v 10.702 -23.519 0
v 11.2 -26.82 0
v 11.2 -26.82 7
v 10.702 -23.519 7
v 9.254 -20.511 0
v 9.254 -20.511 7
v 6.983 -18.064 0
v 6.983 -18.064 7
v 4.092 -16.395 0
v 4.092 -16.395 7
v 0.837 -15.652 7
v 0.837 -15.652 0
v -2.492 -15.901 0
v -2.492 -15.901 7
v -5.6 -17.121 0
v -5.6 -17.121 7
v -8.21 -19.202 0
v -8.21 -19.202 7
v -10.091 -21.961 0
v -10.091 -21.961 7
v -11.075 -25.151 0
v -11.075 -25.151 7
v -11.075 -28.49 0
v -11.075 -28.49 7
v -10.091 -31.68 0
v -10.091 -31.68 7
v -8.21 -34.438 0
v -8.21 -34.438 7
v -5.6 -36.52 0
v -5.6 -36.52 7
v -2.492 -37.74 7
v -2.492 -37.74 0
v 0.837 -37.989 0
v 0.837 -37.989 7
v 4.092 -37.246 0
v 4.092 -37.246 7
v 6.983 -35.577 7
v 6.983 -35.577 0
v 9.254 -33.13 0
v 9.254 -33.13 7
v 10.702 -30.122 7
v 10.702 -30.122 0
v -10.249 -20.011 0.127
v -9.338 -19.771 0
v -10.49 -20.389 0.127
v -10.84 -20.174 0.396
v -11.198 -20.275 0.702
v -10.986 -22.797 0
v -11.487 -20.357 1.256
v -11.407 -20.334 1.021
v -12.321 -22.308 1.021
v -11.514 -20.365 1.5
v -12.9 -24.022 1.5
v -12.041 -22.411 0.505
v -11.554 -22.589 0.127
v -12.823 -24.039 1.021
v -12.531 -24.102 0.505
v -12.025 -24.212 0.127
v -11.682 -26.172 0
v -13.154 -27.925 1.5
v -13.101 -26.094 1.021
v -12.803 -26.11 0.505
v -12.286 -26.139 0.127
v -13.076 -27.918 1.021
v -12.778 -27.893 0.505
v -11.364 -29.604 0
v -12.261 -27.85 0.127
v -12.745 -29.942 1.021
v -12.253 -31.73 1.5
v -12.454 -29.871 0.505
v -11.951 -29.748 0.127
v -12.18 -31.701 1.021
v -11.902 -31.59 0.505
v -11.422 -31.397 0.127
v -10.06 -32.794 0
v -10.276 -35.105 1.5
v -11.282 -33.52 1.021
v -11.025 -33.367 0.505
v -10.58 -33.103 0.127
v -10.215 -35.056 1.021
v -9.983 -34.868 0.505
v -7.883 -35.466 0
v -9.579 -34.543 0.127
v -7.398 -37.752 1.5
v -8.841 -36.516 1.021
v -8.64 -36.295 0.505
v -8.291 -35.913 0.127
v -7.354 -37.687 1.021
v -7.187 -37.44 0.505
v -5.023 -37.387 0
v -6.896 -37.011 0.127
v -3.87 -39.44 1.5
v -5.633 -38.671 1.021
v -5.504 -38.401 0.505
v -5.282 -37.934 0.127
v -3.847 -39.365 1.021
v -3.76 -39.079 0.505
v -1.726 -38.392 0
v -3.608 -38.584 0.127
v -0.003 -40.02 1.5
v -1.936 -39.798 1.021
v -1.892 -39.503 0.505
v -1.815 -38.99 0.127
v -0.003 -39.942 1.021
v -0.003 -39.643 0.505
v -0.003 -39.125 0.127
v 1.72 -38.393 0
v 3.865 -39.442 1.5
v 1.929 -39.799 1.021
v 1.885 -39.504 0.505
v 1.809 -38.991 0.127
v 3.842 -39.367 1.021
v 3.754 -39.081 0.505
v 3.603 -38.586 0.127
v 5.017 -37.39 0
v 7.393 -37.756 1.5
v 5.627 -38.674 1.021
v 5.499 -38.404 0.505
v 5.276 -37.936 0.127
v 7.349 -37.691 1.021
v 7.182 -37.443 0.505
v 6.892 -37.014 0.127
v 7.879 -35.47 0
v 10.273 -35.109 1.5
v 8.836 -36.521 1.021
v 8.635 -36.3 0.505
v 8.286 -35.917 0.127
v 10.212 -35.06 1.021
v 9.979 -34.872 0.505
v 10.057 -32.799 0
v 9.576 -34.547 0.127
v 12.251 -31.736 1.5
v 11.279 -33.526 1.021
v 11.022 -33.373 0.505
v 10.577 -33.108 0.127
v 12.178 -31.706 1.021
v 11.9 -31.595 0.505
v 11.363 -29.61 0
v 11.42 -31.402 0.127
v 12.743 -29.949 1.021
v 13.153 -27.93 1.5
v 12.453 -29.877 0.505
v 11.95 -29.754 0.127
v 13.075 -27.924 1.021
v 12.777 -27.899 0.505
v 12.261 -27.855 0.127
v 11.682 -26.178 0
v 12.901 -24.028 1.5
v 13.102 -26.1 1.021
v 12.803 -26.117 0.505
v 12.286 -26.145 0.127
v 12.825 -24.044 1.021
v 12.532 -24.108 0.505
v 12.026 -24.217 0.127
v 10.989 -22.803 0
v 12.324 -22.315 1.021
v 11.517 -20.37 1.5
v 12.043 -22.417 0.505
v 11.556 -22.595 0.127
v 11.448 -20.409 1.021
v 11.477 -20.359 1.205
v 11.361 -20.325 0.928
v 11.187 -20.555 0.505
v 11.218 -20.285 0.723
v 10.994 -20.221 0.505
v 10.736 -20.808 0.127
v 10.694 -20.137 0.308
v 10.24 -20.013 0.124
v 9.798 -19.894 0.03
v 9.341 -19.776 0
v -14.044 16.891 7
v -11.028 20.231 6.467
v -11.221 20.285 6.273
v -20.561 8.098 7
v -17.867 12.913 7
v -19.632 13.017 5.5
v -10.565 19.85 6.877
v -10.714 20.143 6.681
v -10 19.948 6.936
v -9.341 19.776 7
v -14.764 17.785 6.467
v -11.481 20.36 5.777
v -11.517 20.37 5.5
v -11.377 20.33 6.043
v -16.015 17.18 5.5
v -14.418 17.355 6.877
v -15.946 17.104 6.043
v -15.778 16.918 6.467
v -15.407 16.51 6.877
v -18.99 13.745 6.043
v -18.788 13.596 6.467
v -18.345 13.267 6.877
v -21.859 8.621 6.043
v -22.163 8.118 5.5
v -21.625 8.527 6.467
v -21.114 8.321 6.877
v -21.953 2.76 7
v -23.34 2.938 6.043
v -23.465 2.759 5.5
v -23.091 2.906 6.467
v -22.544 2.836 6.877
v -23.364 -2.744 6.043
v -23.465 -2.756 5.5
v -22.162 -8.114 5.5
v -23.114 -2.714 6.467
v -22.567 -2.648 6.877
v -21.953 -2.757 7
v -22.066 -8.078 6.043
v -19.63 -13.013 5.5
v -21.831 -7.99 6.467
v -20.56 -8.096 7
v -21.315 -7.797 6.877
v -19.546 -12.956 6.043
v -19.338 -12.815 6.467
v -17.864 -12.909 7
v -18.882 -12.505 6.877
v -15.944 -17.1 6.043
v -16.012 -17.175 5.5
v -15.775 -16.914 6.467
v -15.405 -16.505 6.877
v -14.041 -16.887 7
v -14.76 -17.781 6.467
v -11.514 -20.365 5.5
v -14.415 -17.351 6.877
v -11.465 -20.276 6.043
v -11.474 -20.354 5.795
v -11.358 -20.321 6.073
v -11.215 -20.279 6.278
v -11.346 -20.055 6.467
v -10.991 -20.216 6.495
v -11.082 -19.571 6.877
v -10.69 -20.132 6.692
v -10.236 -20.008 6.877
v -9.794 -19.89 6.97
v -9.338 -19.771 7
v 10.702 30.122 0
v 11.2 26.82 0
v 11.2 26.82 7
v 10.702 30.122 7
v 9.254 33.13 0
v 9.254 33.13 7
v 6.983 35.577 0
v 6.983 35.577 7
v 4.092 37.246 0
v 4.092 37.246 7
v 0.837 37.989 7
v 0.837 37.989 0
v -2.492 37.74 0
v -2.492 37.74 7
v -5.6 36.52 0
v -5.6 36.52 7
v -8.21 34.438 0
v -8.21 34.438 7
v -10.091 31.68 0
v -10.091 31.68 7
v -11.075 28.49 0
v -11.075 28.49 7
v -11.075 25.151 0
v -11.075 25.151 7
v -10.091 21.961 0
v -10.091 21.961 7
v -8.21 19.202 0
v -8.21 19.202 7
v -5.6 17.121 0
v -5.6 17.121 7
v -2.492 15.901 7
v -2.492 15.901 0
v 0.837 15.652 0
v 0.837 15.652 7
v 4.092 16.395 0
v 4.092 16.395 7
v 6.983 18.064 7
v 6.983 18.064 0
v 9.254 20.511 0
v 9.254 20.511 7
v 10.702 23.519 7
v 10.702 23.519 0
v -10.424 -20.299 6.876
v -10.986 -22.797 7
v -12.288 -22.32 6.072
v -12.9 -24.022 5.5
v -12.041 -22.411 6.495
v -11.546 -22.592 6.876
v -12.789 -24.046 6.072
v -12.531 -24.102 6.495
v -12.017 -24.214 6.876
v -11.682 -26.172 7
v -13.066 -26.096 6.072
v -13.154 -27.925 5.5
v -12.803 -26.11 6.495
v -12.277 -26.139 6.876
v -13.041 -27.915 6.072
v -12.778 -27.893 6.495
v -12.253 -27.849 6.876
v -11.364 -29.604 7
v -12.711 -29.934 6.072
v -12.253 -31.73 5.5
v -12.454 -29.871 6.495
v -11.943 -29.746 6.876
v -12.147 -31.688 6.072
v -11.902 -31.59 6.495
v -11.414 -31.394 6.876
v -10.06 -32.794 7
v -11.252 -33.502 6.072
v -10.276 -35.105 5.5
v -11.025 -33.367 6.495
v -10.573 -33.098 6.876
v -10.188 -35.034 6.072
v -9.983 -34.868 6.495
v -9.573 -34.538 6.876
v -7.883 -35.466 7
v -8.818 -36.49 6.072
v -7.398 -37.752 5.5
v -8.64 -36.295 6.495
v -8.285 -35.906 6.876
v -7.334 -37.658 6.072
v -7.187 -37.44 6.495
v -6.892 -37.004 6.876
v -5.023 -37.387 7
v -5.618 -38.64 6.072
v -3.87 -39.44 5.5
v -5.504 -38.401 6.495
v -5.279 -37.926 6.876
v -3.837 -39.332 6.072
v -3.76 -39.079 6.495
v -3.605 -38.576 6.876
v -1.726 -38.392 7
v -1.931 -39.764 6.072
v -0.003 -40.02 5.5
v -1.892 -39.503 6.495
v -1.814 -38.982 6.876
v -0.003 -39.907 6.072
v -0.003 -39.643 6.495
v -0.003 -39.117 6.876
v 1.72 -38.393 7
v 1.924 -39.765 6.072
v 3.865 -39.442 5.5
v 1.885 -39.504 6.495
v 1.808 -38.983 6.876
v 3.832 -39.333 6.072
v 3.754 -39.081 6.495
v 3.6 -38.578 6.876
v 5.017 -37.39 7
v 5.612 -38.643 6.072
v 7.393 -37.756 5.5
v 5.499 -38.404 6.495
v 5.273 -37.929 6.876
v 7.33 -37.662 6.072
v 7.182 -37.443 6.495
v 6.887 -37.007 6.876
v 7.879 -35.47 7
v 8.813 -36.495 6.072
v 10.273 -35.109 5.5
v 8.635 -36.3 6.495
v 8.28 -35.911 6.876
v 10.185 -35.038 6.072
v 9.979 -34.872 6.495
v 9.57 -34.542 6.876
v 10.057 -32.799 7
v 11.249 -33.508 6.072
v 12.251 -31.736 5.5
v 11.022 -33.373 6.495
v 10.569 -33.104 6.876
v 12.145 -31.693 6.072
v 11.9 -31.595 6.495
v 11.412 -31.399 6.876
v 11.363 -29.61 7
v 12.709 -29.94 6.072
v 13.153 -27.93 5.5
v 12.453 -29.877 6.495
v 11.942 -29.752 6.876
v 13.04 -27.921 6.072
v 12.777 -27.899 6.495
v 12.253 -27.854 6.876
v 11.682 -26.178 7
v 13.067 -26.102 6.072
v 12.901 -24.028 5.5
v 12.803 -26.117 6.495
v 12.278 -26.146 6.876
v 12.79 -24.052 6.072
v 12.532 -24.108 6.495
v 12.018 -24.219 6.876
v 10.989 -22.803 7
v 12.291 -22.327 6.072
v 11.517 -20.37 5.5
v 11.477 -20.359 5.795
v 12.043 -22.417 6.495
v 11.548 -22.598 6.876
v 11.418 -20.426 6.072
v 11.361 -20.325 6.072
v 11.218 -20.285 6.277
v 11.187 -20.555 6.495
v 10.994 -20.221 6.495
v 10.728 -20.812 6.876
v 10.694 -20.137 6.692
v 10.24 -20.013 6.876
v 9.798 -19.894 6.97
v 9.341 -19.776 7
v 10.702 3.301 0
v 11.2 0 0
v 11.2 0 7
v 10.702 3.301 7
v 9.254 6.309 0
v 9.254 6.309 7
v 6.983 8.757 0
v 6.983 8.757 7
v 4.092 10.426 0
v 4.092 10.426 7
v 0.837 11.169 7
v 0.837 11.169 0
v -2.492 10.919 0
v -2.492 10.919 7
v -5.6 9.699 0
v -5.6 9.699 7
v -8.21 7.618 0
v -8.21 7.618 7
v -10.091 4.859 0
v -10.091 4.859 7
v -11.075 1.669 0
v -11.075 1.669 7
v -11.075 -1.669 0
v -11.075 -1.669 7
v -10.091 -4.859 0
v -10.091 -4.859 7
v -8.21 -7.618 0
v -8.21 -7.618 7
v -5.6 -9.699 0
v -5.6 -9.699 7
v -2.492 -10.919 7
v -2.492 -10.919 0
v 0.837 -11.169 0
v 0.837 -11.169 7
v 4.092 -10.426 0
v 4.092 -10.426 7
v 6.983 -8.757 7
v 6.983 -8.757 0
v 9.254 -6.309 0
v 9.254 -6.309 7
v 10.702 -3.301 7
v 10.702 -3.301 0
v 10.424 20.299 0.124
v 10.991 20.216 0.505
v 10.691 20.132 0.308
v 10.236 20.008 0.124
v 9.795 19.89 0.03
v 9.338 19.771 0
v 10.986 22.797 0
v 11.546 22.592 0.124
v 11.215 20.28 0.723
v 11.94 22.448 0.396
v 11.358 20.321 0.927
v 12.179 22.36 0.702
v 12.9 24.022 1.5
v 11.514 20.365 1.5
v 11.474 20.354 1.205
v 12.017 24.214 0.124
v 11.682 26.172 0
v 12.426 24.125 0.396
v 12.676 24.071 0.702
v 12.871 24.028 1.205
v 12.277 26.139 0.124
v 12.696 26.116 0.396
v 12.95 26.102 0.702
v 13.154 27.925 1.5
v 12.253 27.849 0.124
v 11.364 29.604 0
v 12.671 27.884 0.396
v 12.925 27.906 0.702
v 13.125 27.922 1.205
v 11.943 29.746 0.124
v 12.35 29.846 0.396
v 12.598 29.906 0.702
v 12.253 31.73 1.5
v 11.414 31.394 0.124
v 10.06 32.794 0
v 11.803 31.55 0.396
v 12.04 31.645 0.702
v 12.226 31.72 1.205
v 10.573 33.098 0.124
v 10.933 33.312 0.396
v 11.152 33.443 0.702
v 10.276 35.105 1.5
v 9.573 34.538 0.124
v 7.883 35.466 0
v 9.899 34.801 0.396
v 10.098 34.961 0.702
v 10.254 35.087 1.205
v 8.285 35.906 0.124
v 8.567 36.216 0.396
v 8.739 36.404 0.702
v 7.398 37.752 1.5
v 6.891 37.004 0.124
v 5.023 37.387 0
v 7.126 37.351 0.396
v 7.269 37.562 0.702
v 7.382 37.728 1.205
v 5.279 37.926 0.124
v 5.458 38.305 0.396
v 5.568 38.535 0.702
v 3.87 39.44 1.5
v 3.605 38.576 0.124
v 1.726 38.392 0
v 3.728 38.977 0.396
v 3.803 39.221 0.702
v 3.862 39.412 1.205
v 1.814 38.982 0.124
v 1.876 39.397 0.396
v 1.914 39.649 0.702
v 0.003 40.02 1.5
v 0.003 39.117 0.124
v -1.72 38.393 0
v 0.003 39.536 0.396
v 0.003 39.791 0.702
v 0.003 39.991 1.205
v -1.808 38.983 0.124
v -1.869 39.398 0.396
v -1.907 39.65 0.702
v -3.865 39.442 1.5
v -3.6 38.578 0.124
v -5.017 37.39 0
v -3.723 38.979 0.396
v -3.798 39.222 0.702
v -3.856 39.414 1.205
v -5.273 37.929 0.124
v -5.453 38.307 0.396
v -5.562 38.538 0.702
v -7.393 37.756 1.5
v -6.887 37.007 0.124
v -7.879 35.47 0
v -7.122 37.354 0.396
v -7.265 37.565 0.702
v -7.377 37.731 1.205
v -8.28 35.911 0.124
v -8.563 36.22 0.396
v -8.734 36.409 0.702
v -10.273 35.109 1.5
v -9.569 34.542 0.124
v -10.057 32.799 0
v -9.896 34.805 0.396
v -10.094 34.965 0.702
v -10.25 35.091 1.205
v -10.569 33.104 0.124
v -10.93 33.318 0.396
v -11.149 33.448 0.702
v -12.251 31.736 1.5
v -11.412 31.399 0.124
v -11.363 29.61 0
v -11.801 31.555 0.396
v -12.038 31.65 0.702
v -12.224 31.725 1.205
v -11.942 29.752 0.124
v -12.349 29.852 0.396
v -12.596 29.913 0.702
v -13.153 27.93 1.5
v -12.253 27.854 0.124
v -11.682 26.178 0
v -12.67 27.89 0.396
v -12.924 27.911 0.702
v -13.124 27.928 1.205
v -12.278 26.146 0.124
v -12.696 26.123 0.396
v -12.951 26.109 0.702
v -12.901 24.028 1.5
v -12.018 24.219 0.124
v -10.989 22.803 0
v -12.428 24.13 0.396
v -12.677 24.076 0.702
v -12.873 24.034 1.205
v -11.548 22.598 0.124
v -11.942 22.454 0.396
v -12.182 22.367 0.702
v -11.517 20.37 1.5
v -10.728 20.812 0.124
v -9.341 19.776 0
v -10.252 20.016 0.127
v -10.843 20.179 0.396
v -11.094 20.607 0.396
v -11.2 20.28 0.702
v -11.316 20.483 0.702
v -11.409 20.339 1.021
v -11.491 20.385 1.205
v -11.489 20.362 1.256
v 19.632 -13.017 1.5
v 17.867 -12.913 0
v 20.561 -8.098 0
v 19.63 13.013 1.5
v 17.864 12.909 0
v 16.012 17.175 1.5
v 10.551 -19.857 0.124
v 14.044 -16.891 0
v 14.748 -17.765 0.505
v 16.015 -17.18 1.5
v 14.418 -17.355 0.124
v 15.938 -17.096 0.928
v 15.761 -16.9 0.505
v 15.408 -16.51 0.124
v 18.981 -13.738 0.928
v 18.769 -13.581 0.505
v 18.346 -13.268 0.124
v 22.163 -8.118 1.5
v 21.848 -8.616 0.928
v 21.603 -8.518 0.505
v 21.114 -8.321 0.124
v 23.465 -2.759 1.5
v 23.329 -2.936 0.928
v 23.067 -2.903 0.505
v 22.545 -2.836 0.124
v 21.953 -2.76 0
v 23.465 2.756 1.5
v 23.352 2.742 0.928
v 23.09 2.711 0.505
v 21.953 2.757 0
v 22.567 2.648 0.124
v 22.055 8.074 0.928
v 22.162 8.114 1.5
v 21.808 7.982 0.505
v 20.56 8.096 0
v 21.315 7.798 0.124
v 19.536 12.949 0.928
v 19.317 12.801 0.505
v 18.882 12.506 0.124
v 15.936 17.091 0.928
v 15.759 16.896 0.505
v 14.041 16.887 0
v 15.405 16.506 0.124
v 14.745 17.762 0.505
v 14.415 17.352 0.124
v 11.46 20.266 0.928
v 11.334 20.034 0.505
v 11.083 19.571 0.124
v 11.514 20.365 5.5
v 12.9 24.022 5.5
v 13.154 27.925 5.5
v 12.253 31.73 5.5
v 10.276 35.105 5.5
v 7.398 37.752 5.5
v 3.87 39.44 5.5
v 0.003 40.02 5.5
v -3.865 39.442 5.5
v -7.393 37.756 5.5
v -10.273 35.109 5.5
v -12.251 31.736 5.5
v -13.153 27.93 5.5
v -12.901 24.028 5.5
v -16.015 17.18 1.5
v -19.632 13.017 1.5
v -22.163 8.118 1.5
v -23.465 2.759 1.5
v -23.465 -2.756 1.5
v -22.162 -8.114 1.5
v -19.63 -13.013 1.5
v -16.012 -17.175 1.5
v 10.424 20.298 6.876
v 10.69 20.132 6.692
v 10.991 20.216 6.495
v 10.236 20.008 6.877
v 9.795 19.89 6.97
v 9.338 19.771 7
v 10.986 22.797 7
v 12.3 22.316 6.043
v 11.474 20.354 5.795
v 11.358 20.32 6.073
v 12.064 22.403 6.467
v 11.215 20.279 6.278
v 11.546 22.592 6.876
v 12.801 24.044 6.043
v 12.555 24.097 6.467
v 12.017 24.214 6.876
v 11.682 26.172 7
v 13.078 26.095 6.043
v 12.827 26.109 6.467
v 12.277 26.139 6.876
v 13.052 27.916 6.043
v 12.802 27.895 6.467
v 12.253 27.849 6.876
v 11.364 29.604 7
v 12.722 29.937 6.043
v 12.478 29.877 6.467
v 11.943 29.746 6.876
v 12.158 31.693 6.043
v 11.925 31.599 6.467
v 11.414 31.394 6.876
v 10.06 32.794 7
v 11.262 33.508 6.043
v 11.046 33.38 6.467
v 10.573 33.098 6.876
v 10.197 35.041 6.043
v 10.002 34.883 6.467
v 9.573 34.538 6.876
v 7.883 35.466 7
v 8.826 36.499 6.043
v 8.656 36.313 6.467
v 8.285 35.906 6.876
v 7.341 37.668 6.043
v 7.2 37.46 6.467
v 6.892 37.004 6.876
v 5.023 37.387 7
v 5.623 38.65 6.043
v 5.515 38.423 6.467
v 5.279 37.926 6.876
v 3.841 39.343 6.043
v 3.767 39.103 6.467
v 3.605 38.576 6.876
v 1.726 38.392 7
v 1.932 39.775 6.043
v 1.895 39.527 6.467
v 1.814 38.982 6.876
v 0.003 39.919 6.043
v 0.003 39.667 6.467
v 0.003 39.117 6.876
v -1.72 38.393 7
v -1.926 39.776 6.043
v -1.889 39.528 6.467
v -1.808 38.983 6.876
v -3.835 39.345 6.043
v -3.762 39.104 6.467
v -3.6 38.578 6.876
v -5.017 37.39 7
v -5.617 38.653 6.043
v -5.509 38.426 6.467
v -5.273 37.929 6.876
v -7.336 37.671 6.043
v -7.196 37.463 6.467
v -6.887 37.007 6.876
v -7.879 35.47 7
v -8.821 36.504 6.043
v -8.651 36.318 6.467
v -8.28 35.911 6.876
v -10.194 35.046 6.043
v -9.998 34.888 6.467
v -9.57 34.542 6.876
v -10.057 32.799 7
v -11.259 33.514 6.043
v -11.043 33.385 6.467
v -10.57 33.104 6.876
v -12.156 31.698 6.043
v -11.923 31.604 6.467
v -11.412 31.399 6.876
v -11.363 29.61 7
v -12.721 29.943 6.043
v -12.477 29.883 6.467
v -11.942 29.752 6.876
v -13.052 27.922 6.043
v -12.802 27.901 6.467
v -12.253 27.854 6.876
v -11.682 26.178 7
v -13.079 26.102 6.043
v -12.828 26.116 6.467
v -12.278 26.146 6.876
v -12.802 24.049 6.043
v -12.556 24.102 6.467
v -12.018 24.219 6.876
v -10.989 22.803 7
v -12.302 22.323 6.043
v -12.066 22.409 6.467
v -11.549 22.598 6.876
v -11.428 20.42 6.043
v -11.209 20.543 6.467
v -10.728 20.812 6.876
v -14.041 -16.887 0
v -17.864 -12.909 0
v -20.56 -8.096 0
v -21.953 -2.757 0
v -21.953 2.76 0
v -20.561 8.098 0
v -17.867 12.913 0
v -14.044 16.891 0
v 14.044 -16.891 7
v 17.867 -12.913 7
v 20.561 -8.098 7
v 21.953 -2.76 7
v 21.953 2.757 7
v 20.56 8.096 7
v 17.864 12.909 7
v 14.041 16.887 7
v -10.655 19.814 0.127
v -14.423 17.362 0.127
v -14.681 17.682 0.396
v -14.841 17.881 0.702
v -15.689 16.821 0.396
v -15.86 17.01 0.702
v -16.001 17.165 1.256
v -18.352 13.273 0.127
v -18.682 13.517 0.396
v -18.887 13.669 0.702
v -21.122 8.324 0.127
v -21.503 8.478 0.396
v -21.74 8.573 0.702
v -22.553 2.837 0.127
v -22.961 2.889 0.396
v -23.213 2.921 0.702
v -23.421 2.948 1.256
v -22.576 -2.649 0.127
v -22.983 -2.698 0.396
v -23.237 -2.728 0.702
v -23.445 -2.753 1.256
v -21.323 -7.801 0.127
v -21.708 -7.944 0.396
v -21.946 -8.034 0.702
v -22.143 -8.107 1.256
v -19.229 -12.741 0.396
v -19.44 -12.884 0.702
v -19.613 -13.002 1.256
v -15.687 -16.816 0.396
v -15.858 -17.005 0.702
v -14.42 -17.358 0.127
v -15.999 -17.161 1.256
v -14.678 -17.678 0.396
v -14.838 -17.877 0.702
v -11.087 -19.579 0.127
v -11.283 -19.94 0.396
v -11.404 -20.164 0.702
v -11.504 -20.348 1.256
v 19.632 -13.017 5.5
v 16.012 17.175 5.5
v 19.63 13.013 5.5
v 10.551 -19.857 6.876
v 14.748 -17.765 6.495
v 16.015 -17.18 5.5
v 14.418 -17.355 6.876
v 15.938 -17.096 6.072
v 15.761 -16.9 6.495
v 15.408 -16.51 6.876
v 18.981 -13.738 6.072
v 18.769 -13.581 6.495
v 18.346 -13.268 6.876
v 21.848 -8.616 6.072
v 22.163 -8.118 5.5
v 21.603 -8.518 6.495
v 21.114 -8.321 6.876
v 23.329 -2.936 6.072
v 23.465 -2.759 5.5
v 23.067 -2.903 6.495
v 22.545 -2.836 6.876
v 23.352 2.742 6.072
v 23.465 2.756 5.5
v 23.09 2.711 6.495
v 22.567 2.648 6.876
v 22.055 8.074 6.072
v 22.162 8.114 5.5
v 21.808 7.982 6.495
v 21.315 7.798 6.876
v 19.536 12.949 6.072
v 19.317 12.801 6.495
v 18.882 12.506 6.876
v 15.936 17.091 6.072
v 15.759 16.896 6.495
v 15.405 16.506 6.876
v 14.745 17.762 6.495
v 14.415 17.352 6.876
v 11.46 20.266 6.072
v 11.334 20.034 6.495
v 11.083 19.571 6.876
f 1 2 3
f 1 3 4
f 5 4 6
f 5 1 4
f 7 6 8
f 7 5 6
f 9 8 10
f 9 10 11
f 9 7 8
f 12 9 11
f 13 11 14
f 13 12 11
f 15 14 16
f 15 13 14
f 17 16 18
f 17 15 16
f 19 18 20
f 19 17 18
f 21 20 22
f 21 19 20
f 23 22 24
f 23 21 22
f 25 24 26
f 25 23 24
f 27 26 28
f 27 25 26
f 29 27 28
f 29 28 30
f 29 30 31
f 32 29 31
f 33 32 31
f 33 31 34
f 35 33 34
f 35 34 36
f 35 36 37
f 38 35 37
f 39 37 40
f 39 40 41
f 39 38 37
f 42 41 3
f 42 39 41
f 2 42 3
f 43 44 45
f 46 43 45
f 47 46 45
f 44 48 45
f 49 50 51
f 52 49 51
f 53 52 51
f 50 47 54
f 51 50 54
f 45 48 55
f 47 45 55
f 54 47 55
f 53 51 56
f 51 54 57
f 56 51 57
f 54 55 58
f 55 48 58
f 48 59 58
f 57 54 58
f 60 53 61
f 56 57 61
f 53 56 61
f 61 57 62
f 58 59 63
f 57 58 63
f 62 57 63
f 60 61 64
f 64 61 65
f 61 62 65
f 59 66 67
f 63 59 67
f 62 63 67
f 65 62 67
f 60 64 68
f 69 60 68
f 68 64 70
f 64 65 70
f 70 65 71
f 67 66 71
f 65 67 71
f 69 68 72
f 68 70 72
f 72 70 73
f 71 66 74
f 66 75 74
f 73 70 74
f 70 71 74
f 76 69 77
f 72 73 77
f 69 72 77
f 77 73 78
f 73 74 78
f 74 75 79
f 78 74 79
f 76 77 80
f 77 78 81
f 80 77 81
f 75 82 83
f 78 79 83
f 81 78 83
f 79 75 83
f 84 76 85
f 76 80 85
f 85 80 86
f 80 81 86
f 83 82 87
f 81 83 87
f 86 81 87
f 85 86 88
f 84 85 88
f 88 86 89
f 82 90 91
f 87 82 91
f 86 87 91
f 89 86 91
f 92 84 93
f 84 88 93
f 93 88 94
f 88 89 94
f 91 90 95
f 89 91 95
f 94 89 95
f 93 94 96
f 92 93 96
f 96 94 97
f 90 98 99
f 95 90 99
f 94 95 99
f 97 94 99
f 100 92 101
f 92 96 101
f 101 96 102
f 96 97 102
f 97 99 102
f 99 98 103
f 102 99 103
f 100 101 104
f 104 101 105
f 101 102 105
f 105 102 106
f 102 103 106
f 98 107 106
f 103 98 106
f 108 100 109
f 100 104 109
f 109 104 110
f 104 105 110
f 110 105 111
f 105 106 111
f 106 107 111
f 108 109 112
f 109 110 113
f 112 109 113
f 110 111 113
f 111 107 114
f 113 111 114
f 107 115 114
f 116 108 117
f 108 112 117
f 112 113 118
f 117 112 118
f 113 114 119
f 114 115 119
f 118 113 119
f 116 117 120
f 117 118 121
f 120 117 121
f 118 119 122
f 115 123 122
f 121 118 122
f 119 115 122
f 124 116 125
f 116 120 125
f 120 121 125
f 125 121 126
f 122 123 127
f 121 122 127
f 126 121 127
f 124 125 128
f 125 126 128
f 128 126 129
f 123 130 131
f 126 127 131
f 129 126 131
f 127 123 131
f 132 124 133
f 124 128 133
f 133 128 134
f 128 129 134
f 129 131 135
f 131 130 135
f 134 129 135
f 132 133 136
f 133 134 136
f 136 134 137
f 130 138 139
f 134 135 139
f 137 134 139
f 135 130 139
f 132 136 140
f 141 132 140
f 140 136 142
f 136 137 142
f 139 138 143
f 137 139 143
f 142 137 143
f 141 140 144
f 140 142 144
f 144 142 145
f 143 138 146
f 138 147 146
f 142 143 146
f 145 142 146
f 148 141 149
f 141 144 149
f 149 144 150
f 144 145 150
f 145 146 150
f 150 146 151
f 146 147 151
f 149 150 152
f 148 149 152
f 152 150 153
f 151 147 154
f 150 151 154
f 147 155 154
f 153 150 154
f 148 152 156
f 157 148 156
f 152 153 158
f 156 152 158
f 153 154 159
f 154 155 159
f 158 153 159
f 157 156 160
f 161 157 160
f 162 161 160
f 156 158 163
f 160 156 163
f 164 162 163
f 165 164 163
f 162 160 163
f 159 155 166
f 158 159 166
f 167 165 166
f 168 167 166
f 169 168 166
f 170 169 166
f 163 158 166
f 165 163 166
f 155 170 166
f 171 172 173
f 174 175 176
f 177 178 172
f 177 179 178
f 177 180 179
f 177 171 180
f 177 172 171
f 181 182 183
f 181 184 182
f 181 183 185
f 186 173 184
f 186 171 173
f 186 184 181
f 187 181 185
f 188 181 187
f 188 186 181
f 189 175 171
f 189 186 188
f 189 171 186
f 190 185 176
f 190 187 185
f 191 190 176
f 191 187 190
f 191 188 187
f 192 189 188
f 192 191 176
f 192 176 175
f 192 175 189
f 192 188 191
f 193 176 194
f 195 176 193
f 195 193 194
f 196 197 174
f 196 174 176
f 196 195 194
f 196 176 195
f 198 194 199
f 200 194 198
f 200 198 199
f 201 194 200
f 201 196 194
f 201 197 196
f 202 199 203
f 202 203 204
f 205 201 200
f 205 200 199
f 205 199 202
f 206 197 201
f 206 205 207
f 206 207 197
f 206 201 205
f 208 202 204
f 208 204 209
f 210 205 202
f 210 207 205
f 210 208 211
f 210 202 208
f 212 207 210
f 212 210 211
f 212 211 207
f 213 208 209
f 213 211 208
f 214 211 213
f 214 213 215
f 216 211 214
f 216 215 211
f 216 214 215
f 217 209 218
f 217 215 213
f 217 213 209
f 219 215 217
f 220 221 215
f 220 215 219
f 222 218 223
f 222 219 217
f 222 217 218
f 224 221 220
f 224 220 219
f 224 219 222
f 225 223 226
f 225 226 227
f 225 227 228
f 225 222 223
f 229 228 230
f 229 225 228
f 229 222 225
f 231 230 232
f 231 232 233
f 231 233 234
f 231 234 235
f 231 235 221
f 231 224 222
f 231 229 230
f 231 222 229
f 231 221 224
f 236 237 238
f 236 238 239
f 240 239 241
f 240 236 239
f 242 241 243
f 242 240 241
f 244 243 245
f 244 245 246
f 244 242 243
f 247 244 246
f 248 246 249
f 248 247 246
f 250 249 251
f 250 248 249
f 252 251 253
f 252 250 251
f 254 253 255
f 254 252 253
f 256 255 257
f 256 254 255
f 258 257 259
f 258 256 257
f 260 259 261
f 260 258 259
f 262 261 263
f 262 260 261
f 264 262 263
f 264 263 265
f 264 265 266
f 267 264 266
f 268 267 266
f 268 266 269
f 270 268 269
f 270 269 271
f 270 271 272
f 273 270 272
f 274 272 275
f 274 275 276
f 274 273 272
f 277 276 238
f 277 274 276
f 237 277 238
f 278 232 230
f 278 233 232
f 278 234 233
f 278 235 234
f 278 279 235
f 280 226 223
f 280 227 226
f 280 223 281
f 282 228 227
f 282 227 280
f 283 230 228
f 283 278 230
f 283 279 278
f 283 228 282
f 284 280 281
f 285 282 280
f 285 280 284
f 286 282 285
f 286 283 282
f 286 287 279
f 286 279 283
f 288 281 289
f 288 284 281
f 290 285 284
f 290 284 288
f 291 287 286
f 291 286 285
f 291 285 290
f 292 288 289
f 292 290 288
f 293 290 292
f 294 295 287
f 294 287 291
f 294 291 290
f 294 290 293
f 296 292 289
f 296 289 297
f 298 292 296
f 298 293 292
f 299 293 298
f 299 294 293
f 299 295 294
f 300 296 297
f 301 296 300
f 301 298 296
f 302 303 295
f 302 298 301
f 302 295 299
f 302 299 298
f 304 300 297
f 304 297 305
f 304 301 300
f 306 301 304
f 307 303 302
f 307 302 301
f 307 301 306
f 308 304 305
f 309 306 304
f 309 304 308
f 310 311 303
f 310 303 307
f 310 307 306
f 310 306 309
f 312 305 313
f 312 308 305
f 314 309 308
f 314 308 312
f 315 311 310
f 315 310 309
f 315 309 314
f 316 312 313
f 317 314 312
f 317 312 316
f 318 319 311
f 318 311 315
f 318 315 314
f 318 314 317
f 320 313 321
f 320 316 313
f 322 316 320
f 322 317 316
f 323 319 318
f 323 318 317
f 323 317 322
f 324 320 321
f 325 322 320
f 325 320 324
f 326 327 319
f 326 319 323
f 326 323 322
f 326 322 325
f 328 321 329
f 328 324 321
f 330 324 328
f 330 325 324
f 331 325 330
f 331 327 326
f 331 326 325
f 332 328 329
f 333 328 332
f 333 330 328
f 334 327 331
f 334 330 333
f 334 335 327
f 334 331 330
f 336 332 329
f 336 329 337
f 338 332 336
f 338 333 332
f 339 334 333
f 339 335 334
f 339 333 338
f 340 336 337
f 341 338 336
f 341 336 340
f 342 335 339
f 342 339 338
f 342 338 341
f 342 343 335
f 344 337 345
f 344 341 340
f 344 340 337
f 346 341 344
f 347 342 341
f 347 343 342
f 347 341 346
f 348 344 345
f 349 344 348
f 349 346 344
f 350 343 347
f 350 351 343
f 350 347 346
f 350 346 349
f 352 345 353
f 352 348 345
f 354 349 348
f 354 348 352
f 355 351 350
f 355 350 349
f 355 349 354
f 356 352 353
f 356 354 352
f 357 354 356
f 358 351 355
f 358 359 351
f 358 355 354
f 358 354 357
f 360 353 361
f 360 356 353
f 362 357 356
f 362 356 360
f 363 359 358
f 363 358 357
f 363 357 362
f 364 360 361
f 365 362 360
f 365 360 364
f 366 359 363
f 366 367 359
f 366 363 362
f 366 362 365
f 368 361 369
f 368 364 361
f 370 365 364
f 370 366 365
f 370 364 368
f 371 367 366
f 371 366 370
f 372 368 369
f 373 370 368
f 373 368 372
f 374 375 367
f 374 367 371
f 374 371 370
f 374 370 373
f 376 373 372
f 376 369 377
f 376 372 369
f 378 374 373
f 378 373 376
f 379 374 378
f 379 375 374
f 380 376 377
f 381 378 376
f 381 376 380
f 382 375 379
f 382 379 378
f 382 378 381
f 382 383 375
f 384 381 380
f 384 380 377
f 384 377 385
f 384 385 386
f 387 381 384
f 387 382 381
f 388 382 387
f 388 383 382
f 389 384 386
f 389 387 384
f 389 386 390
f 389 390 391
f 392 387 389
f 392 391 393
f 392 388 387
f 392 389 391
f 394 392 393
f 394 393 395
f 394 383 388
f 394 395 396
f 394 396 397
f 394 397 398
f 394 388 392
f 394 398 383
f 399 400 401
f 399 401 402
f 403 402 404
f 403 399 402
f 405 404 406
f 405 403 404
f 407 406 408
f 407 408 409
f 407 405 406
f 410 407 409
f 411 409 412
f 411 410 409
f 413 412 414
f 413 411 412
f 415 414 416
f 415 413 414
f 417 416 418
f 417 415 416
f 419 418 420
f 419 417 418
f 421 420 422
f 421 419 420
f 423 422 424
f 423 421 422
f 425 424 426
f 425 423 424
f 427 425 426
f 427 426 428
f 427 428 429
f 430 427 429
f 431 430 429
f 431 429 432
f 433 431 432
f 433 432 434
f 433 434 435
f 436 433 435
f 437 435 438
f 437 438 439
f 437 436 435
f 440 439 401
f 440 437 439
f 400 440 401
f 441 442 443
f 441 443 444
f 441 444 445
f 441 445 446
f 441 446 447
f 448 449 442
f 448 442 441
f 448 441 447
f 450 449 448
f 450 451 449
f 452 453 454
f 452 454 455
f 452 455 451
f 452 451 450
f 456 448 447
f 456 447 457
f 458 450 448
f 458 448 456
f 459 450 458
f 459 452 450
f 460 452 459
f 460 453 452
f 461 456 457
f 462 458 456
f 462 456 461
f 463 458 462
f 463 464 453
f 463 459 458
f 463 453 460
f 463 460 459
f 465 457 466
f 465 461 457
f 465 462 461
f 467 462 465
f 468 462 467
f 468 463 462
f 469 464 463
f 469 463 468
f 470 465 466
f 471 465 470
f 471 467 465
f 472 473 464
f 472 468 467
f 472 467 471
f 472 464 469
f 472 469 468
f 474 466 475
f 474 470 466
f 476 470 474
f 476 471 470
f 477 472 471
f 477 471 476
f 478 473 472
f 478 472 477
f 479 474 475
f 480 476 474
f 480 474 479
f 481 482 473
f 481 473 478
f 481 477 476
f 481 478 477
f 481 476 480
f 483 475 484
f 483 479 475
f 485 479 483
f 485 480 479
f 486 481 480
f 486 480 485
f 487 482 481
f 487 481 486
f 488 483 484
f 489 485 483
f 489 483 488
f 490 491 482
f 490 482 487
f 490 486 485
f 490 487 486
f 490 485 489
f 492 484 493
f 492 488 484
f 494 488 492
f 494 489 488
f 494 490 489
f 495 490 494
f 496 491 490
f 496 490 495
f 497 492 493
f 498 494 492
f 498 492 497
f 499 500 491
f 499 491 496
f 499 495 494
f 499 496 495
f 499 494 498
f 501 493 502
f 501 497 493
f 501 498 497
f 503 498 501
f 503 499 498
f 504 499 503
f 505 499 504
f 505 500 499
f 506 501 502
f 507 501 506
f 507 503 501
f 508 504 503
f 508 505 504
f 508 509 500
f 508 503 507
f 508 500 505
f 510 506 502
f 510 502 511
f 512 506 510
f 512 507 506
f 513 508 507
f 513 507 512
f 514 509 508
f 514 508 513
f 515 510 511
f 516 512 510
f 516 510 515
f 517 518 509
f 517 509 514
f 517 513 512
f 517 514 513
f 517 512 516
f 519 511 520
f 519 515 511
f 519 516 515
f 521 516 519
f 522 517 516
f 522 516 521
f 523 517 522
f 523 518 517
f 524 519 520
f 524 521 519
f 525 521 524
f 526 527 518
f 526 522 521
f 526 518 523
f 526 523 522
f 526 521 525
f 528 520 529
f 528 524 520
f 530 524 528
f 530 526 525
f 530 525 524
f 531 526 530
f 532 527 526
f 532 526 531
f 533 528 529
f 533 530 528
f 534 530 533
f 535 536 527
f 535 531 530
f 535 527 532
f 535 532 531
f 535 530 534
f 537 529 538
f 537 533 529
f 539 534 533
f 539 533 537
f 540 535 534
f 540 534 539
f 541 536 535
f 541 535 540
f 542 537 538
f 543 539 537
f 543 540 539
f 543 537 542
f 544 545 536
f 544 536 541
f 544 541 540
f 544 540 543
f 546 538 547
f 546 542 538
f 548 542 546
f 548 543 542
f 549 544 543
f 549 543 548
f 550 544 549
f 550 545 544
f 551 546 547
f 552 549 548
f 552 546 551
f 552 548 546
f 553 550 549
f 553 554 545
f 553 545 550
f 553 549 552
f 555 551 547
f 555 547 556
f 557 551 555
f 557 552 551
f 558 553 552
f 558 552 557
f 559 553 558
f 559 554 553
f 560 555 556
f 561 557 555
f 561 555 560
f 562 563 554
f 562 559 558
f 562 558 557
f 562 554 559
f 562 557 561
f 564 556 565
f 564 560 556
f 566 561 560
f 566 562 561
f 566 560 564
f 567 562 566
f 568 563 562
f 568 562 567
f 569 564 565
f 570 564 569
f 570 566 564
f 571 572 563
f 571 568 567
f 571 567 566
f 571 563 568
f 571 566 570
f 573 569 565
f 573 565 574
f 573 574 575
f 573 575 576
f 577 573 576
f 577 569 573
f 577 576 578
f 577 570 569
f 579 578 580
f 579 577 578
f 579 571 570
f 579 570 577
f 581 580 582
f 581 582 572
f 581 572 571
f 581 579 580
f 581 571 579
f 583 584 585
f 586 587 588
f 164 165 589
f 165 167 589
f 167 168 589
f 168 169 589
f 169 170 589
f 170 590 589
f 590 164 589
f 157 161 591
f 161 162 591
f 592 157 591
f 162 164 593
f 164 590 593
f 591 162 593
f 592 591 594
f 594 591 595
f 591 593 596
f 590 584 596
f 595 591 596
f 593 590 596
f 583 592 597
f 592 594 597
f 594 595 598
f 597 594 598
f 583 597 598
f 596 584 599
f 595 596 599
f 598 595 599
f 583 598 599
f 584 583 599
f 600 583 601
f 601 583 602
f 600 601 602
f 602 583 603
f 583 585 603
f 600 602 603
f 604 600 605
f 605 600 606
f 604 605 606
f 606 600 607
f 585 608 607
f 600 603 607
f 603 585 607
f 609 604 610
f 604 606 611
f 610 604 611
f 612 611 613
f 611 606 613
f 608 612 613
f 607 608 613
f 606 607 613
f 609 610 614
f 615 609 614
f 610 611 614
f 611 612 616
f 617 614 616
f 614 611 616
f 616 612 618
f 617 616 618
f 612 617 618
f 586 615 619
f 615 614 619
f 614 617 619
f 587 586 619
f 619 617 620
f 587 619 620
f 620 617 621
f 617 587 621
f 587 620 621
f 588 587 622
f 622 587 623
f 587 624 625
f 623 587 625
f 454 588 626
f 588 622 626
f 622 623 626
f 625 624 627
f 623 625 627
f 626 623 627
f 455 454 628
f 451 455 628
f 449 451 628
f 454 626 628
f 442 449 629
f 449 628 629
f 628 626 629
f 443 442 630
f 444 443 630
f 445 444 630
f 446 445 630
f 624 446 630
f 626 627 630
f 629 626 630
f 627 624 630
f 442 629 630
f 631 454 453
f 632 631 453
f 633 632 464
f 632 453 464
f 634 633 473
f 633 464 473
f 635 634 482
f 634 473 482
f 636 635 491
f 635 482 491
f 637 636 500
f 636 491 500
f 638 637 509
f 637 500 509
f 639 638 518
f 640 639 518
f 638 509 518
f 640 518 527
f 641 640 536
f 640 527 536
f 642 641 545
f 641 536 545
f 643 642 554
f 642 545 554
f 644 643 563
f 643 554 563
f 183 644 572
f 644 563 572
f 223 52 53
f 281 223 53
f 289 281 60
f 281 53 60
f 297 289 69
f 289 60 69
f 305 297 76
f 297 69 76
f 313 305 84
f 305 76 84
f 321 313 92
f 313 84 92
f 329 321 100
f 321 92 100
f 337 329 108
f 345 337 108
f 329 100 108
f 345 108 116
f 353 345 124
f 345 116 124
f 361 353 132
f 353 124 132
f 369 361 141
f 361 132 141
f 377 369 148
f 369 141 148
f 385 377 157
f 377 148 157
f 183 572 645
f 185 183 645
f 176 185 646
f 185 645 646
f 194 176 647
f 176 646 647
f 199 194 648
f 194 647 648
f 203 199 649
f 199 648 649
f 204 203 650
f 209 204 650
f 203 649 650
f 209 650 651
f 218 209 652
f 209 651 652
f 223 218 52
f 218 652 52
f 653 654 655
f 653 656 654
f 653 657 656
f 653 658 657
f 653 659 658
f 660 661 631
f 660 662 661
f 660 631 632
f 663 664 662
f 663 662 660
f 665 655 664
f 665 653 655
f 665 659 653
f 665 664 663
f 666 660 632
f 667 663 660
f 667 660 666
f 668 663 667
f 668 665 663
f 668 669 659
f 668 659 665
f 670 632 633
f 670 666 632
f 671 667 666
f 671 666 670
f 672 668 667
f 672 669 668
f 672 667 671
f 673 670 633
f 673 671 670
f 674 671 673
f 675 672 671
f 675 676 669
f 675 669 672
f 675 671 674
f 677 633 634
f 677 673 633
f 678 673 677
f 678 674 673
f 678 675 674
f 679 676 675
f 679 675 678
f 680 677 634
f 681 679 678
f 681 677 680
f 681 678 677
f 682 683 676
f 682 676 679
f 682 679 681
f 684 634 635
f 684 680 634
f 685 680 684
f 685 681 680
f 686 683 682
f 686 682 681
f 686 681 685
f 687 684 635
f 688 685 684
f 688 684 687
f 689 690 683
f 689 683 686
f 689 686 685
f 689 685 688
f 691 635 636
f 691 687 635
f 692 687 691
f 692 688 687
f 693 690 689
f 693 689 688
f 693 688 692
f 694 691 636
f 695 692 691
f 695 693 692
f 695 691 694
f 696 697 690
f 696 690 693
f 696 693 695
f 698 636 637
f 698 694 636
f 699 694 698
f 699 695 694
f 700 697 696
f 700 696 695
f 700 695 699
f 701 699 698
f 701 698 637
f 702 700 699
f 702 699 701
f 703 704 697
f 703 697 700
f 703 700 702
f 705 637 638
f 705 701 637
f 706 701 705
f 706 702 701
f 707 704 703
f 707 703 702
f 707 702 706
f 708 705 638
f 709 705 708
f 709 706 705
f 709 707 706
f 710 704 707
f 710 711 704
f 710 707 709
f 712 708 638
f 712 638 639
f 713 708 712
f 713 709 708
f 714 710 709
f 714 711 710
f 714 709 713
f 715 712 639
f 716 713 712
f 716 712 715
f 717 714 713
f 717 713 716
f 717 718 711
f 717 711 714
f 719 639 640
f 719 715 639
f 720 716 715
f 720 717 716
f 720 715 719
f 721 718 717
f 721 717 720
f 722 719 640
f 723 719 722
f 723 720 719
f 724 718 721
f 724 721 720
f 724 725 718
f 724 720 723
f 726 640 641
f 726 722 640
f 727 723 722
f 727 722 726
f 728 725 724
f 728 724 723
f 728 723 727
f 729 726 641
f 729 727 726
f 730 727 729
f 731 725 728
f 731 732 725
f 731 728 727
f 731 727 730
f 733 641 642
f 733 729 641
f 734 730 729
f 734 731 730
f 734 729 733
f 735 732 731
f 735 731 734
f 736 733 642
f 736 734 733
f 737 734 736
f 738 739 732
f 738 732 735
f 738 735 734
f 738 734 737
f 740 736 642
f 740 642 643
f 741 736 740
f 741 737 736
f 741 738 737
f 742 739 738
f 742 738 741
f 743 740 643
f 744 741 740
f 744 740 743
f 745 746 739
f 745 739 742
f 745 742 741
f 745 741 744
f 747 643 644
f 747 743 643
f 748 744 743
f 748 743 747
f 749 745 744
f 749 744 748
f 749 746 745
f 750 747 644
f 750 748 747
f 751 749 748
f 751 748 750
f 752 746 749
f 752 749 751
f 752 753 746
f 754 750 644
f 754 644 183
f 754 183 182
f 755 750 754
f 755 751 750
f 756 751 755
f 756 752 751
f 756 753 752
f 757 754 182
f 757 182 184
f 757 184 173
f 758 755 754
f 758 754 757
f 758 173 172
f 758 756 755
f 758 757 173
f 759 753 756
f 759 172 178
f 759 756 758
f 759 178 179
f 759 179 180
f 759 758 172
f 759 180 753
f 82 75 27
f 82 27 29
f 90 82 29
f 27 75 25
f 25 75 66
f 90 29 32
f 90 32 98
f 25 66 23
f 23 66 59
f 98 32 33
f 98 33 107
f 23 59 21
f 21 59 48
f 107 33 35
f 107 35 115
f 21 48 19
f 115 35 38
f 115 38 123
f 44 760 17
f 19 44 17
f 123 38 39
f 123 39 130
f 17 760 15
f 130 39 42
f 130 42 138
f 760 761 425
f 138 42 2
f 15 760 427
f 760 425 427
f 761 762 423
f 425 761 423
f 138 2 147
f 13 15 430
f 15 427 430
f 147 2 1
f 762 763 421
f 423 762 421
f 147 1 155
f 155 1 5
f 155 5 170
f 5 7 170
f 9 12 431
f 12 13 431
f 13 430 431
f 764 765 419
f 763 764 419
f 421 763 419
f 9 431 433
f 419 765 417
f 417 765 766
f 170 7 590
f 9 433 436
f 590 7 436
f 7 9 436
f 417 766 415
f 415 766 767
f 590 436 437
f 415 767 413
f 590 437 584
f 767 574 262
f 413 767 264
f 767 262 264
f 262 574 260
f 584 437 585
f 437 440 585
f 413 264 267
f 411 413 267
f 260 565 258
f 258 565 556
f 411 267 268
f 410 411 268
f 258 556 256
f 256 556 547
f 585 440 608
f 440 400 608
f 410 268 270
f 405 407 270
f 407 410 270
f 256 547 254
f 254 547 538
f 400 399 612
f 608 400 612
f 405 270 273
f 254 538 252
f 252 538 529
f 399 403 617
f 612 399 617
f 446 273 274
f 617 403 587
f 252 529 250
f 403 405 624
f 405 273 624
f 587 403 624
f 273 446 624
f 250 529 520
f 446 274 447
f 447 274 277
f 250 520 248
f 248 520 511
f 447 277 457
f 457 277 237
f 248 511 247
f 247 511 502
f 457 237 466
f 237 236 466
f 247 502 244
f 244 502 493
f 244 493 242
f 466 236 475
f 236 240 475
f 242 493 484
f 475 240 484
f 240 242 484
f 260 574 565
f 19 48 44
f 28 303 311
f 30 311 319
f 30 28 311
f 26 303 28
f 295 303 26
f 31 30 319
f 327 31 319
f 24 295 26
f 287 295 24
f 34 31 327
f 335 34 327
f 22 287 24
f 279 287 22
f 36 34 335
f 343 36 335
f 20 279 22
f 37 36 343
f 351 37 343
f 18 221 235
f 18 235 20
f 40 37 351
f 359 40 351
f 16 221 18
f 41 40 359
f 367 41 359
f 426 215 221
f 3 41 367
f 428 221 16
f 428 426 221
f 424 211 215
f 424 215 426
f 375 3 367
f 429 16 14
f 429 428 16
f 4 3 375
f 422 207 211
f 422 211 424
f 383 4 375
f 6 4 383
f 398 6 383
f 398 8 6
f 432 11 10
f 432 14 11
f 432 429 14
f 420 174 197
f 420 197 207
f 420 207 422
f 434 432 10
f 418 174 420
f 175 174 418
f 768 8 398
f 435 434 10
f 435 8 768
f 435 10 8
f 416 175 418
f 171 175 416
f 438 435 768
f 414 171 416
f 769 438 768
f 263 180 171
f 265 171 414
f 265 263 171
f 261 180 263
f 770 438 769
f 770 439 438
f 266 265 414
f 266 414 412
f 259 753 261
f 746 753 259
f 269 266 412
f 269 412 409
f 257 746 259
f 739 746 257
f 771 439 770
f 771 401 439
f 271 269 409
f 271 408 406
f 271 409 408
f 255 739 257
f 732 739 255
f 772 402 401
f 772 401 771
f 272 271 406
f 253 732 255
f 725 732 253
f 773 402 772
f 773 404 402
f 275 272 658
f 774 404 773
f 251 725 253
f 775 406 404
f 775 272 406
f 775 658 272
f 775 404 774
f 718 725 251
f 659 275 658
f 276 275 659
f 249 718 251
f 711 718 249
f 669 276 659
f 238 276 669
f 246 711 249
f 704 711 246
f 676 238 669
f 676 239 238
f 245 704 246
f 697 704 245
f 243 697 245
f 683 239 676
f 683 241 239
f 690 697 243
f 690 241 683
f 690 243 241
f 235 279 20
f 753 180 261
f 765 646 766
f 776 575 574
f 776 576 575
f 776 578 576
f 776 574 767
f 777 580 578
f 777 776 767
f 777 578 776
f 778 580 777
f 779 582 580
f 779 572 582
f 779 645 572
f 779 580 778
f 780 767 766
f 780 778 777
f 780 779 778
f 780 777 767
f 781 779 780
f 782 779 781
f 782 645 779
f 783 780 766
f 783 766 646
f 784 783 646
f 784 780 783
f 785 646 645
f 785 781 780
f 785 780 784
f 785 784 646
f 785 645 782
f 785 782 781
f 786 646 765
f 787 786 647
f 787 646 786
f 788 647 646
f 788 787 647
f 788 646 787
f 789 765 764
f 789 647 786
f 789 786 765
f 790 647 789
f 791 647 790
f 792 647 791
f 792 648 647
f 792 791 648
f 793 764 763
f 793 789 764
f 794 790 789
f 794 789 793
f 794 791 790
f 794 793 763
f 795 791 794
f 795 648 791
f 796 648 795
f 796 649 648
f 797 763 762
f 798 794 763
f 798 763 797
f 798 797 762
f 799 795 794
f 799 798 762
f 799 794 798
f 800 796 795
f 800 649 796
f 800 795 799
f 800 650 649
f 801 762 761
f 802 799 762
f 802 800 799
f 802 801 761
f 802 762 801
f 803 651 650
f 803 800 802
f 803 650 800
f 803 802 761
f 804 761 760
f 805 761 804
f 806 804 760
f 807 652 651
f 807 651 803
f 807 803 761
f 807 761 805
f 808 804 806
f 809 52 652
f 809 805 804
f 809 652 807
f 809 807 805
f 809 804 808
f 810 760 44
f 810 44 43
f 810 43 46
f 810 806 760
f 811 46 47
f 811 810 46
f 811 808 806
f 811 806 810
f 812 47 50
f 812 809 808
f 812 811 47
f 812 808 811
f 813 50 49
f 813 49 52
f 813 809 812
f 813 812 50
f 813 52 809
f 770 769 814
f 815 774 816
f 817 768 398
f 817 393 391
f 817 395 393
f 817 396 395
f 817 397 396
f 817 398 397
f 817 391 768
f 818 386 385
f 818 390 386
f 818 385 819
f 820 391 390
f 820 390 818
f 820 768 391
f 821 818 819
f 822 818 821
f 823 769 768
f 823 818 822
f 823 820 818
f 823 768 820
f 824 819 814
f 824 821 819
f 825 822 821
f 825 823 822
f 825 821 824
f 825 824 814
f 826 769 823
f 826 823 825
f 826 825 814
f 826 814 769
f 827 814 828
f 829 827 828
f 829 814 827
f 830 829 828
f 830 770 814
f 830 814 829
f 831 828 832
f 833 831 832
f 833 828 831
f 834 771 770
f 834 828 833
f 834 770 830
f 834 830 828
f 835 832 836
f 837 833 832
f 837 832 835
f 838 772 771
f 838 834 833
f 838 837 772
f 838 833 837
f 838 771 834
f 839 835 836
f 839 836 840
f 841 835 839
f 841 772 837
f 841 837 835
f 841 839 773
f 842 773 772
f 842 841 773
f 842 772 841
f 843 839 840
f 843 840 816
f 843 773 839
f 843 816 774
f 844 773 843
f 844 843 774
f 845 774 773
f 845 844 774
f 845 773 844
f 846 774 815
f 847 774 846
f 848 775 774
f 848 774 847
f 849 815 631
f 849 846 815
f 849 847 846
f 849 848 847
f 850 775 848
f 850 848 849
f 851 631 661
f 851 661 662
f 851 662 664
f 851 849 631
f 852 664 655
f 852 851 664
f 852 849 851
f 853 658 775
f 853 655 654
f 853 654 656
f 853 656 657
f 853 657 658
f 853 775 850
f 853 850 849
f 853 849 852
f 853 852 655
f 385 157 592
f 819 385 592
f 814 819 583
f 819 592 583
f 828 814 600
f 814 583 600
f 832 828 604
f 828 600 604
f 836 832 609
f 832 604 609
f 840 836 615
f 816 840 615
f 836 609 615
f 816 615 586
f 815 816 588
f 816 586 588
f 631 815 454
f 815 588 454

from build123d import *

# Parameters (mm, degrees)
F0_R     = 11.2
F1_DEPTH = 7
F2_R     = 1.5
F3_R     = 1.5


with BuildPart() as f1:
    # F0 (on Top) → F1 (new body)
    with BuildSketch(Plane.XY):
        with BuildLine():
            ThreePointArc((11.516784, -20.370315), (23.629371, -0.001645), (11.51402, 20.365381))
            ThreePointArc((11.51402, 20.365381), (0.002827, 40.020406), (-11.516784, 20.370315))
            ThreePointArc((-11.516784, 20.370315), (-23.629371, 0.001645), (-11.51402, -20.365381))
            ThreePointArc((-11.51402, -20.365381), (-0.002827, -40.020406), (11.516784, -20.370315))
        make_face()
        with Locations((0, -26.820406)):
            Circle(F0_R, mode=Mode.SUBTRACT)
        Circle(F0_R, mode=Mode.SUBTRACT)
        with Locations((0, 26.820406)):
            Circle(F0_R, mode=Mode.SUBTRACT)
    extrude(amount=F1_DEPTH)

    # F2
    f2_edges = [f1.edges().sort_by_distance(p)[0] for p in [
        (-23.629371, 0.001645, 7),
        (0.002827, 40.020406, 7),
        (23.629371, -0.001645, 7),
        (-0.002827, -40.020406, 7),
    ]]
    fillet(f2_edges, radius=F2_R)

    # F3
    f3_edges = [f1.edges().sort_by_distance(p)[0] for p in [
        (23.629371, -0.001645, 0),
        (0.002827, 40.020406, 0),
        (-23.629371, 0.001645, 0),
        (-0.002827, -40.020406, 0),
    ]]
    fillet(f3_edges, radius=F3_R)


solid = f1.part
